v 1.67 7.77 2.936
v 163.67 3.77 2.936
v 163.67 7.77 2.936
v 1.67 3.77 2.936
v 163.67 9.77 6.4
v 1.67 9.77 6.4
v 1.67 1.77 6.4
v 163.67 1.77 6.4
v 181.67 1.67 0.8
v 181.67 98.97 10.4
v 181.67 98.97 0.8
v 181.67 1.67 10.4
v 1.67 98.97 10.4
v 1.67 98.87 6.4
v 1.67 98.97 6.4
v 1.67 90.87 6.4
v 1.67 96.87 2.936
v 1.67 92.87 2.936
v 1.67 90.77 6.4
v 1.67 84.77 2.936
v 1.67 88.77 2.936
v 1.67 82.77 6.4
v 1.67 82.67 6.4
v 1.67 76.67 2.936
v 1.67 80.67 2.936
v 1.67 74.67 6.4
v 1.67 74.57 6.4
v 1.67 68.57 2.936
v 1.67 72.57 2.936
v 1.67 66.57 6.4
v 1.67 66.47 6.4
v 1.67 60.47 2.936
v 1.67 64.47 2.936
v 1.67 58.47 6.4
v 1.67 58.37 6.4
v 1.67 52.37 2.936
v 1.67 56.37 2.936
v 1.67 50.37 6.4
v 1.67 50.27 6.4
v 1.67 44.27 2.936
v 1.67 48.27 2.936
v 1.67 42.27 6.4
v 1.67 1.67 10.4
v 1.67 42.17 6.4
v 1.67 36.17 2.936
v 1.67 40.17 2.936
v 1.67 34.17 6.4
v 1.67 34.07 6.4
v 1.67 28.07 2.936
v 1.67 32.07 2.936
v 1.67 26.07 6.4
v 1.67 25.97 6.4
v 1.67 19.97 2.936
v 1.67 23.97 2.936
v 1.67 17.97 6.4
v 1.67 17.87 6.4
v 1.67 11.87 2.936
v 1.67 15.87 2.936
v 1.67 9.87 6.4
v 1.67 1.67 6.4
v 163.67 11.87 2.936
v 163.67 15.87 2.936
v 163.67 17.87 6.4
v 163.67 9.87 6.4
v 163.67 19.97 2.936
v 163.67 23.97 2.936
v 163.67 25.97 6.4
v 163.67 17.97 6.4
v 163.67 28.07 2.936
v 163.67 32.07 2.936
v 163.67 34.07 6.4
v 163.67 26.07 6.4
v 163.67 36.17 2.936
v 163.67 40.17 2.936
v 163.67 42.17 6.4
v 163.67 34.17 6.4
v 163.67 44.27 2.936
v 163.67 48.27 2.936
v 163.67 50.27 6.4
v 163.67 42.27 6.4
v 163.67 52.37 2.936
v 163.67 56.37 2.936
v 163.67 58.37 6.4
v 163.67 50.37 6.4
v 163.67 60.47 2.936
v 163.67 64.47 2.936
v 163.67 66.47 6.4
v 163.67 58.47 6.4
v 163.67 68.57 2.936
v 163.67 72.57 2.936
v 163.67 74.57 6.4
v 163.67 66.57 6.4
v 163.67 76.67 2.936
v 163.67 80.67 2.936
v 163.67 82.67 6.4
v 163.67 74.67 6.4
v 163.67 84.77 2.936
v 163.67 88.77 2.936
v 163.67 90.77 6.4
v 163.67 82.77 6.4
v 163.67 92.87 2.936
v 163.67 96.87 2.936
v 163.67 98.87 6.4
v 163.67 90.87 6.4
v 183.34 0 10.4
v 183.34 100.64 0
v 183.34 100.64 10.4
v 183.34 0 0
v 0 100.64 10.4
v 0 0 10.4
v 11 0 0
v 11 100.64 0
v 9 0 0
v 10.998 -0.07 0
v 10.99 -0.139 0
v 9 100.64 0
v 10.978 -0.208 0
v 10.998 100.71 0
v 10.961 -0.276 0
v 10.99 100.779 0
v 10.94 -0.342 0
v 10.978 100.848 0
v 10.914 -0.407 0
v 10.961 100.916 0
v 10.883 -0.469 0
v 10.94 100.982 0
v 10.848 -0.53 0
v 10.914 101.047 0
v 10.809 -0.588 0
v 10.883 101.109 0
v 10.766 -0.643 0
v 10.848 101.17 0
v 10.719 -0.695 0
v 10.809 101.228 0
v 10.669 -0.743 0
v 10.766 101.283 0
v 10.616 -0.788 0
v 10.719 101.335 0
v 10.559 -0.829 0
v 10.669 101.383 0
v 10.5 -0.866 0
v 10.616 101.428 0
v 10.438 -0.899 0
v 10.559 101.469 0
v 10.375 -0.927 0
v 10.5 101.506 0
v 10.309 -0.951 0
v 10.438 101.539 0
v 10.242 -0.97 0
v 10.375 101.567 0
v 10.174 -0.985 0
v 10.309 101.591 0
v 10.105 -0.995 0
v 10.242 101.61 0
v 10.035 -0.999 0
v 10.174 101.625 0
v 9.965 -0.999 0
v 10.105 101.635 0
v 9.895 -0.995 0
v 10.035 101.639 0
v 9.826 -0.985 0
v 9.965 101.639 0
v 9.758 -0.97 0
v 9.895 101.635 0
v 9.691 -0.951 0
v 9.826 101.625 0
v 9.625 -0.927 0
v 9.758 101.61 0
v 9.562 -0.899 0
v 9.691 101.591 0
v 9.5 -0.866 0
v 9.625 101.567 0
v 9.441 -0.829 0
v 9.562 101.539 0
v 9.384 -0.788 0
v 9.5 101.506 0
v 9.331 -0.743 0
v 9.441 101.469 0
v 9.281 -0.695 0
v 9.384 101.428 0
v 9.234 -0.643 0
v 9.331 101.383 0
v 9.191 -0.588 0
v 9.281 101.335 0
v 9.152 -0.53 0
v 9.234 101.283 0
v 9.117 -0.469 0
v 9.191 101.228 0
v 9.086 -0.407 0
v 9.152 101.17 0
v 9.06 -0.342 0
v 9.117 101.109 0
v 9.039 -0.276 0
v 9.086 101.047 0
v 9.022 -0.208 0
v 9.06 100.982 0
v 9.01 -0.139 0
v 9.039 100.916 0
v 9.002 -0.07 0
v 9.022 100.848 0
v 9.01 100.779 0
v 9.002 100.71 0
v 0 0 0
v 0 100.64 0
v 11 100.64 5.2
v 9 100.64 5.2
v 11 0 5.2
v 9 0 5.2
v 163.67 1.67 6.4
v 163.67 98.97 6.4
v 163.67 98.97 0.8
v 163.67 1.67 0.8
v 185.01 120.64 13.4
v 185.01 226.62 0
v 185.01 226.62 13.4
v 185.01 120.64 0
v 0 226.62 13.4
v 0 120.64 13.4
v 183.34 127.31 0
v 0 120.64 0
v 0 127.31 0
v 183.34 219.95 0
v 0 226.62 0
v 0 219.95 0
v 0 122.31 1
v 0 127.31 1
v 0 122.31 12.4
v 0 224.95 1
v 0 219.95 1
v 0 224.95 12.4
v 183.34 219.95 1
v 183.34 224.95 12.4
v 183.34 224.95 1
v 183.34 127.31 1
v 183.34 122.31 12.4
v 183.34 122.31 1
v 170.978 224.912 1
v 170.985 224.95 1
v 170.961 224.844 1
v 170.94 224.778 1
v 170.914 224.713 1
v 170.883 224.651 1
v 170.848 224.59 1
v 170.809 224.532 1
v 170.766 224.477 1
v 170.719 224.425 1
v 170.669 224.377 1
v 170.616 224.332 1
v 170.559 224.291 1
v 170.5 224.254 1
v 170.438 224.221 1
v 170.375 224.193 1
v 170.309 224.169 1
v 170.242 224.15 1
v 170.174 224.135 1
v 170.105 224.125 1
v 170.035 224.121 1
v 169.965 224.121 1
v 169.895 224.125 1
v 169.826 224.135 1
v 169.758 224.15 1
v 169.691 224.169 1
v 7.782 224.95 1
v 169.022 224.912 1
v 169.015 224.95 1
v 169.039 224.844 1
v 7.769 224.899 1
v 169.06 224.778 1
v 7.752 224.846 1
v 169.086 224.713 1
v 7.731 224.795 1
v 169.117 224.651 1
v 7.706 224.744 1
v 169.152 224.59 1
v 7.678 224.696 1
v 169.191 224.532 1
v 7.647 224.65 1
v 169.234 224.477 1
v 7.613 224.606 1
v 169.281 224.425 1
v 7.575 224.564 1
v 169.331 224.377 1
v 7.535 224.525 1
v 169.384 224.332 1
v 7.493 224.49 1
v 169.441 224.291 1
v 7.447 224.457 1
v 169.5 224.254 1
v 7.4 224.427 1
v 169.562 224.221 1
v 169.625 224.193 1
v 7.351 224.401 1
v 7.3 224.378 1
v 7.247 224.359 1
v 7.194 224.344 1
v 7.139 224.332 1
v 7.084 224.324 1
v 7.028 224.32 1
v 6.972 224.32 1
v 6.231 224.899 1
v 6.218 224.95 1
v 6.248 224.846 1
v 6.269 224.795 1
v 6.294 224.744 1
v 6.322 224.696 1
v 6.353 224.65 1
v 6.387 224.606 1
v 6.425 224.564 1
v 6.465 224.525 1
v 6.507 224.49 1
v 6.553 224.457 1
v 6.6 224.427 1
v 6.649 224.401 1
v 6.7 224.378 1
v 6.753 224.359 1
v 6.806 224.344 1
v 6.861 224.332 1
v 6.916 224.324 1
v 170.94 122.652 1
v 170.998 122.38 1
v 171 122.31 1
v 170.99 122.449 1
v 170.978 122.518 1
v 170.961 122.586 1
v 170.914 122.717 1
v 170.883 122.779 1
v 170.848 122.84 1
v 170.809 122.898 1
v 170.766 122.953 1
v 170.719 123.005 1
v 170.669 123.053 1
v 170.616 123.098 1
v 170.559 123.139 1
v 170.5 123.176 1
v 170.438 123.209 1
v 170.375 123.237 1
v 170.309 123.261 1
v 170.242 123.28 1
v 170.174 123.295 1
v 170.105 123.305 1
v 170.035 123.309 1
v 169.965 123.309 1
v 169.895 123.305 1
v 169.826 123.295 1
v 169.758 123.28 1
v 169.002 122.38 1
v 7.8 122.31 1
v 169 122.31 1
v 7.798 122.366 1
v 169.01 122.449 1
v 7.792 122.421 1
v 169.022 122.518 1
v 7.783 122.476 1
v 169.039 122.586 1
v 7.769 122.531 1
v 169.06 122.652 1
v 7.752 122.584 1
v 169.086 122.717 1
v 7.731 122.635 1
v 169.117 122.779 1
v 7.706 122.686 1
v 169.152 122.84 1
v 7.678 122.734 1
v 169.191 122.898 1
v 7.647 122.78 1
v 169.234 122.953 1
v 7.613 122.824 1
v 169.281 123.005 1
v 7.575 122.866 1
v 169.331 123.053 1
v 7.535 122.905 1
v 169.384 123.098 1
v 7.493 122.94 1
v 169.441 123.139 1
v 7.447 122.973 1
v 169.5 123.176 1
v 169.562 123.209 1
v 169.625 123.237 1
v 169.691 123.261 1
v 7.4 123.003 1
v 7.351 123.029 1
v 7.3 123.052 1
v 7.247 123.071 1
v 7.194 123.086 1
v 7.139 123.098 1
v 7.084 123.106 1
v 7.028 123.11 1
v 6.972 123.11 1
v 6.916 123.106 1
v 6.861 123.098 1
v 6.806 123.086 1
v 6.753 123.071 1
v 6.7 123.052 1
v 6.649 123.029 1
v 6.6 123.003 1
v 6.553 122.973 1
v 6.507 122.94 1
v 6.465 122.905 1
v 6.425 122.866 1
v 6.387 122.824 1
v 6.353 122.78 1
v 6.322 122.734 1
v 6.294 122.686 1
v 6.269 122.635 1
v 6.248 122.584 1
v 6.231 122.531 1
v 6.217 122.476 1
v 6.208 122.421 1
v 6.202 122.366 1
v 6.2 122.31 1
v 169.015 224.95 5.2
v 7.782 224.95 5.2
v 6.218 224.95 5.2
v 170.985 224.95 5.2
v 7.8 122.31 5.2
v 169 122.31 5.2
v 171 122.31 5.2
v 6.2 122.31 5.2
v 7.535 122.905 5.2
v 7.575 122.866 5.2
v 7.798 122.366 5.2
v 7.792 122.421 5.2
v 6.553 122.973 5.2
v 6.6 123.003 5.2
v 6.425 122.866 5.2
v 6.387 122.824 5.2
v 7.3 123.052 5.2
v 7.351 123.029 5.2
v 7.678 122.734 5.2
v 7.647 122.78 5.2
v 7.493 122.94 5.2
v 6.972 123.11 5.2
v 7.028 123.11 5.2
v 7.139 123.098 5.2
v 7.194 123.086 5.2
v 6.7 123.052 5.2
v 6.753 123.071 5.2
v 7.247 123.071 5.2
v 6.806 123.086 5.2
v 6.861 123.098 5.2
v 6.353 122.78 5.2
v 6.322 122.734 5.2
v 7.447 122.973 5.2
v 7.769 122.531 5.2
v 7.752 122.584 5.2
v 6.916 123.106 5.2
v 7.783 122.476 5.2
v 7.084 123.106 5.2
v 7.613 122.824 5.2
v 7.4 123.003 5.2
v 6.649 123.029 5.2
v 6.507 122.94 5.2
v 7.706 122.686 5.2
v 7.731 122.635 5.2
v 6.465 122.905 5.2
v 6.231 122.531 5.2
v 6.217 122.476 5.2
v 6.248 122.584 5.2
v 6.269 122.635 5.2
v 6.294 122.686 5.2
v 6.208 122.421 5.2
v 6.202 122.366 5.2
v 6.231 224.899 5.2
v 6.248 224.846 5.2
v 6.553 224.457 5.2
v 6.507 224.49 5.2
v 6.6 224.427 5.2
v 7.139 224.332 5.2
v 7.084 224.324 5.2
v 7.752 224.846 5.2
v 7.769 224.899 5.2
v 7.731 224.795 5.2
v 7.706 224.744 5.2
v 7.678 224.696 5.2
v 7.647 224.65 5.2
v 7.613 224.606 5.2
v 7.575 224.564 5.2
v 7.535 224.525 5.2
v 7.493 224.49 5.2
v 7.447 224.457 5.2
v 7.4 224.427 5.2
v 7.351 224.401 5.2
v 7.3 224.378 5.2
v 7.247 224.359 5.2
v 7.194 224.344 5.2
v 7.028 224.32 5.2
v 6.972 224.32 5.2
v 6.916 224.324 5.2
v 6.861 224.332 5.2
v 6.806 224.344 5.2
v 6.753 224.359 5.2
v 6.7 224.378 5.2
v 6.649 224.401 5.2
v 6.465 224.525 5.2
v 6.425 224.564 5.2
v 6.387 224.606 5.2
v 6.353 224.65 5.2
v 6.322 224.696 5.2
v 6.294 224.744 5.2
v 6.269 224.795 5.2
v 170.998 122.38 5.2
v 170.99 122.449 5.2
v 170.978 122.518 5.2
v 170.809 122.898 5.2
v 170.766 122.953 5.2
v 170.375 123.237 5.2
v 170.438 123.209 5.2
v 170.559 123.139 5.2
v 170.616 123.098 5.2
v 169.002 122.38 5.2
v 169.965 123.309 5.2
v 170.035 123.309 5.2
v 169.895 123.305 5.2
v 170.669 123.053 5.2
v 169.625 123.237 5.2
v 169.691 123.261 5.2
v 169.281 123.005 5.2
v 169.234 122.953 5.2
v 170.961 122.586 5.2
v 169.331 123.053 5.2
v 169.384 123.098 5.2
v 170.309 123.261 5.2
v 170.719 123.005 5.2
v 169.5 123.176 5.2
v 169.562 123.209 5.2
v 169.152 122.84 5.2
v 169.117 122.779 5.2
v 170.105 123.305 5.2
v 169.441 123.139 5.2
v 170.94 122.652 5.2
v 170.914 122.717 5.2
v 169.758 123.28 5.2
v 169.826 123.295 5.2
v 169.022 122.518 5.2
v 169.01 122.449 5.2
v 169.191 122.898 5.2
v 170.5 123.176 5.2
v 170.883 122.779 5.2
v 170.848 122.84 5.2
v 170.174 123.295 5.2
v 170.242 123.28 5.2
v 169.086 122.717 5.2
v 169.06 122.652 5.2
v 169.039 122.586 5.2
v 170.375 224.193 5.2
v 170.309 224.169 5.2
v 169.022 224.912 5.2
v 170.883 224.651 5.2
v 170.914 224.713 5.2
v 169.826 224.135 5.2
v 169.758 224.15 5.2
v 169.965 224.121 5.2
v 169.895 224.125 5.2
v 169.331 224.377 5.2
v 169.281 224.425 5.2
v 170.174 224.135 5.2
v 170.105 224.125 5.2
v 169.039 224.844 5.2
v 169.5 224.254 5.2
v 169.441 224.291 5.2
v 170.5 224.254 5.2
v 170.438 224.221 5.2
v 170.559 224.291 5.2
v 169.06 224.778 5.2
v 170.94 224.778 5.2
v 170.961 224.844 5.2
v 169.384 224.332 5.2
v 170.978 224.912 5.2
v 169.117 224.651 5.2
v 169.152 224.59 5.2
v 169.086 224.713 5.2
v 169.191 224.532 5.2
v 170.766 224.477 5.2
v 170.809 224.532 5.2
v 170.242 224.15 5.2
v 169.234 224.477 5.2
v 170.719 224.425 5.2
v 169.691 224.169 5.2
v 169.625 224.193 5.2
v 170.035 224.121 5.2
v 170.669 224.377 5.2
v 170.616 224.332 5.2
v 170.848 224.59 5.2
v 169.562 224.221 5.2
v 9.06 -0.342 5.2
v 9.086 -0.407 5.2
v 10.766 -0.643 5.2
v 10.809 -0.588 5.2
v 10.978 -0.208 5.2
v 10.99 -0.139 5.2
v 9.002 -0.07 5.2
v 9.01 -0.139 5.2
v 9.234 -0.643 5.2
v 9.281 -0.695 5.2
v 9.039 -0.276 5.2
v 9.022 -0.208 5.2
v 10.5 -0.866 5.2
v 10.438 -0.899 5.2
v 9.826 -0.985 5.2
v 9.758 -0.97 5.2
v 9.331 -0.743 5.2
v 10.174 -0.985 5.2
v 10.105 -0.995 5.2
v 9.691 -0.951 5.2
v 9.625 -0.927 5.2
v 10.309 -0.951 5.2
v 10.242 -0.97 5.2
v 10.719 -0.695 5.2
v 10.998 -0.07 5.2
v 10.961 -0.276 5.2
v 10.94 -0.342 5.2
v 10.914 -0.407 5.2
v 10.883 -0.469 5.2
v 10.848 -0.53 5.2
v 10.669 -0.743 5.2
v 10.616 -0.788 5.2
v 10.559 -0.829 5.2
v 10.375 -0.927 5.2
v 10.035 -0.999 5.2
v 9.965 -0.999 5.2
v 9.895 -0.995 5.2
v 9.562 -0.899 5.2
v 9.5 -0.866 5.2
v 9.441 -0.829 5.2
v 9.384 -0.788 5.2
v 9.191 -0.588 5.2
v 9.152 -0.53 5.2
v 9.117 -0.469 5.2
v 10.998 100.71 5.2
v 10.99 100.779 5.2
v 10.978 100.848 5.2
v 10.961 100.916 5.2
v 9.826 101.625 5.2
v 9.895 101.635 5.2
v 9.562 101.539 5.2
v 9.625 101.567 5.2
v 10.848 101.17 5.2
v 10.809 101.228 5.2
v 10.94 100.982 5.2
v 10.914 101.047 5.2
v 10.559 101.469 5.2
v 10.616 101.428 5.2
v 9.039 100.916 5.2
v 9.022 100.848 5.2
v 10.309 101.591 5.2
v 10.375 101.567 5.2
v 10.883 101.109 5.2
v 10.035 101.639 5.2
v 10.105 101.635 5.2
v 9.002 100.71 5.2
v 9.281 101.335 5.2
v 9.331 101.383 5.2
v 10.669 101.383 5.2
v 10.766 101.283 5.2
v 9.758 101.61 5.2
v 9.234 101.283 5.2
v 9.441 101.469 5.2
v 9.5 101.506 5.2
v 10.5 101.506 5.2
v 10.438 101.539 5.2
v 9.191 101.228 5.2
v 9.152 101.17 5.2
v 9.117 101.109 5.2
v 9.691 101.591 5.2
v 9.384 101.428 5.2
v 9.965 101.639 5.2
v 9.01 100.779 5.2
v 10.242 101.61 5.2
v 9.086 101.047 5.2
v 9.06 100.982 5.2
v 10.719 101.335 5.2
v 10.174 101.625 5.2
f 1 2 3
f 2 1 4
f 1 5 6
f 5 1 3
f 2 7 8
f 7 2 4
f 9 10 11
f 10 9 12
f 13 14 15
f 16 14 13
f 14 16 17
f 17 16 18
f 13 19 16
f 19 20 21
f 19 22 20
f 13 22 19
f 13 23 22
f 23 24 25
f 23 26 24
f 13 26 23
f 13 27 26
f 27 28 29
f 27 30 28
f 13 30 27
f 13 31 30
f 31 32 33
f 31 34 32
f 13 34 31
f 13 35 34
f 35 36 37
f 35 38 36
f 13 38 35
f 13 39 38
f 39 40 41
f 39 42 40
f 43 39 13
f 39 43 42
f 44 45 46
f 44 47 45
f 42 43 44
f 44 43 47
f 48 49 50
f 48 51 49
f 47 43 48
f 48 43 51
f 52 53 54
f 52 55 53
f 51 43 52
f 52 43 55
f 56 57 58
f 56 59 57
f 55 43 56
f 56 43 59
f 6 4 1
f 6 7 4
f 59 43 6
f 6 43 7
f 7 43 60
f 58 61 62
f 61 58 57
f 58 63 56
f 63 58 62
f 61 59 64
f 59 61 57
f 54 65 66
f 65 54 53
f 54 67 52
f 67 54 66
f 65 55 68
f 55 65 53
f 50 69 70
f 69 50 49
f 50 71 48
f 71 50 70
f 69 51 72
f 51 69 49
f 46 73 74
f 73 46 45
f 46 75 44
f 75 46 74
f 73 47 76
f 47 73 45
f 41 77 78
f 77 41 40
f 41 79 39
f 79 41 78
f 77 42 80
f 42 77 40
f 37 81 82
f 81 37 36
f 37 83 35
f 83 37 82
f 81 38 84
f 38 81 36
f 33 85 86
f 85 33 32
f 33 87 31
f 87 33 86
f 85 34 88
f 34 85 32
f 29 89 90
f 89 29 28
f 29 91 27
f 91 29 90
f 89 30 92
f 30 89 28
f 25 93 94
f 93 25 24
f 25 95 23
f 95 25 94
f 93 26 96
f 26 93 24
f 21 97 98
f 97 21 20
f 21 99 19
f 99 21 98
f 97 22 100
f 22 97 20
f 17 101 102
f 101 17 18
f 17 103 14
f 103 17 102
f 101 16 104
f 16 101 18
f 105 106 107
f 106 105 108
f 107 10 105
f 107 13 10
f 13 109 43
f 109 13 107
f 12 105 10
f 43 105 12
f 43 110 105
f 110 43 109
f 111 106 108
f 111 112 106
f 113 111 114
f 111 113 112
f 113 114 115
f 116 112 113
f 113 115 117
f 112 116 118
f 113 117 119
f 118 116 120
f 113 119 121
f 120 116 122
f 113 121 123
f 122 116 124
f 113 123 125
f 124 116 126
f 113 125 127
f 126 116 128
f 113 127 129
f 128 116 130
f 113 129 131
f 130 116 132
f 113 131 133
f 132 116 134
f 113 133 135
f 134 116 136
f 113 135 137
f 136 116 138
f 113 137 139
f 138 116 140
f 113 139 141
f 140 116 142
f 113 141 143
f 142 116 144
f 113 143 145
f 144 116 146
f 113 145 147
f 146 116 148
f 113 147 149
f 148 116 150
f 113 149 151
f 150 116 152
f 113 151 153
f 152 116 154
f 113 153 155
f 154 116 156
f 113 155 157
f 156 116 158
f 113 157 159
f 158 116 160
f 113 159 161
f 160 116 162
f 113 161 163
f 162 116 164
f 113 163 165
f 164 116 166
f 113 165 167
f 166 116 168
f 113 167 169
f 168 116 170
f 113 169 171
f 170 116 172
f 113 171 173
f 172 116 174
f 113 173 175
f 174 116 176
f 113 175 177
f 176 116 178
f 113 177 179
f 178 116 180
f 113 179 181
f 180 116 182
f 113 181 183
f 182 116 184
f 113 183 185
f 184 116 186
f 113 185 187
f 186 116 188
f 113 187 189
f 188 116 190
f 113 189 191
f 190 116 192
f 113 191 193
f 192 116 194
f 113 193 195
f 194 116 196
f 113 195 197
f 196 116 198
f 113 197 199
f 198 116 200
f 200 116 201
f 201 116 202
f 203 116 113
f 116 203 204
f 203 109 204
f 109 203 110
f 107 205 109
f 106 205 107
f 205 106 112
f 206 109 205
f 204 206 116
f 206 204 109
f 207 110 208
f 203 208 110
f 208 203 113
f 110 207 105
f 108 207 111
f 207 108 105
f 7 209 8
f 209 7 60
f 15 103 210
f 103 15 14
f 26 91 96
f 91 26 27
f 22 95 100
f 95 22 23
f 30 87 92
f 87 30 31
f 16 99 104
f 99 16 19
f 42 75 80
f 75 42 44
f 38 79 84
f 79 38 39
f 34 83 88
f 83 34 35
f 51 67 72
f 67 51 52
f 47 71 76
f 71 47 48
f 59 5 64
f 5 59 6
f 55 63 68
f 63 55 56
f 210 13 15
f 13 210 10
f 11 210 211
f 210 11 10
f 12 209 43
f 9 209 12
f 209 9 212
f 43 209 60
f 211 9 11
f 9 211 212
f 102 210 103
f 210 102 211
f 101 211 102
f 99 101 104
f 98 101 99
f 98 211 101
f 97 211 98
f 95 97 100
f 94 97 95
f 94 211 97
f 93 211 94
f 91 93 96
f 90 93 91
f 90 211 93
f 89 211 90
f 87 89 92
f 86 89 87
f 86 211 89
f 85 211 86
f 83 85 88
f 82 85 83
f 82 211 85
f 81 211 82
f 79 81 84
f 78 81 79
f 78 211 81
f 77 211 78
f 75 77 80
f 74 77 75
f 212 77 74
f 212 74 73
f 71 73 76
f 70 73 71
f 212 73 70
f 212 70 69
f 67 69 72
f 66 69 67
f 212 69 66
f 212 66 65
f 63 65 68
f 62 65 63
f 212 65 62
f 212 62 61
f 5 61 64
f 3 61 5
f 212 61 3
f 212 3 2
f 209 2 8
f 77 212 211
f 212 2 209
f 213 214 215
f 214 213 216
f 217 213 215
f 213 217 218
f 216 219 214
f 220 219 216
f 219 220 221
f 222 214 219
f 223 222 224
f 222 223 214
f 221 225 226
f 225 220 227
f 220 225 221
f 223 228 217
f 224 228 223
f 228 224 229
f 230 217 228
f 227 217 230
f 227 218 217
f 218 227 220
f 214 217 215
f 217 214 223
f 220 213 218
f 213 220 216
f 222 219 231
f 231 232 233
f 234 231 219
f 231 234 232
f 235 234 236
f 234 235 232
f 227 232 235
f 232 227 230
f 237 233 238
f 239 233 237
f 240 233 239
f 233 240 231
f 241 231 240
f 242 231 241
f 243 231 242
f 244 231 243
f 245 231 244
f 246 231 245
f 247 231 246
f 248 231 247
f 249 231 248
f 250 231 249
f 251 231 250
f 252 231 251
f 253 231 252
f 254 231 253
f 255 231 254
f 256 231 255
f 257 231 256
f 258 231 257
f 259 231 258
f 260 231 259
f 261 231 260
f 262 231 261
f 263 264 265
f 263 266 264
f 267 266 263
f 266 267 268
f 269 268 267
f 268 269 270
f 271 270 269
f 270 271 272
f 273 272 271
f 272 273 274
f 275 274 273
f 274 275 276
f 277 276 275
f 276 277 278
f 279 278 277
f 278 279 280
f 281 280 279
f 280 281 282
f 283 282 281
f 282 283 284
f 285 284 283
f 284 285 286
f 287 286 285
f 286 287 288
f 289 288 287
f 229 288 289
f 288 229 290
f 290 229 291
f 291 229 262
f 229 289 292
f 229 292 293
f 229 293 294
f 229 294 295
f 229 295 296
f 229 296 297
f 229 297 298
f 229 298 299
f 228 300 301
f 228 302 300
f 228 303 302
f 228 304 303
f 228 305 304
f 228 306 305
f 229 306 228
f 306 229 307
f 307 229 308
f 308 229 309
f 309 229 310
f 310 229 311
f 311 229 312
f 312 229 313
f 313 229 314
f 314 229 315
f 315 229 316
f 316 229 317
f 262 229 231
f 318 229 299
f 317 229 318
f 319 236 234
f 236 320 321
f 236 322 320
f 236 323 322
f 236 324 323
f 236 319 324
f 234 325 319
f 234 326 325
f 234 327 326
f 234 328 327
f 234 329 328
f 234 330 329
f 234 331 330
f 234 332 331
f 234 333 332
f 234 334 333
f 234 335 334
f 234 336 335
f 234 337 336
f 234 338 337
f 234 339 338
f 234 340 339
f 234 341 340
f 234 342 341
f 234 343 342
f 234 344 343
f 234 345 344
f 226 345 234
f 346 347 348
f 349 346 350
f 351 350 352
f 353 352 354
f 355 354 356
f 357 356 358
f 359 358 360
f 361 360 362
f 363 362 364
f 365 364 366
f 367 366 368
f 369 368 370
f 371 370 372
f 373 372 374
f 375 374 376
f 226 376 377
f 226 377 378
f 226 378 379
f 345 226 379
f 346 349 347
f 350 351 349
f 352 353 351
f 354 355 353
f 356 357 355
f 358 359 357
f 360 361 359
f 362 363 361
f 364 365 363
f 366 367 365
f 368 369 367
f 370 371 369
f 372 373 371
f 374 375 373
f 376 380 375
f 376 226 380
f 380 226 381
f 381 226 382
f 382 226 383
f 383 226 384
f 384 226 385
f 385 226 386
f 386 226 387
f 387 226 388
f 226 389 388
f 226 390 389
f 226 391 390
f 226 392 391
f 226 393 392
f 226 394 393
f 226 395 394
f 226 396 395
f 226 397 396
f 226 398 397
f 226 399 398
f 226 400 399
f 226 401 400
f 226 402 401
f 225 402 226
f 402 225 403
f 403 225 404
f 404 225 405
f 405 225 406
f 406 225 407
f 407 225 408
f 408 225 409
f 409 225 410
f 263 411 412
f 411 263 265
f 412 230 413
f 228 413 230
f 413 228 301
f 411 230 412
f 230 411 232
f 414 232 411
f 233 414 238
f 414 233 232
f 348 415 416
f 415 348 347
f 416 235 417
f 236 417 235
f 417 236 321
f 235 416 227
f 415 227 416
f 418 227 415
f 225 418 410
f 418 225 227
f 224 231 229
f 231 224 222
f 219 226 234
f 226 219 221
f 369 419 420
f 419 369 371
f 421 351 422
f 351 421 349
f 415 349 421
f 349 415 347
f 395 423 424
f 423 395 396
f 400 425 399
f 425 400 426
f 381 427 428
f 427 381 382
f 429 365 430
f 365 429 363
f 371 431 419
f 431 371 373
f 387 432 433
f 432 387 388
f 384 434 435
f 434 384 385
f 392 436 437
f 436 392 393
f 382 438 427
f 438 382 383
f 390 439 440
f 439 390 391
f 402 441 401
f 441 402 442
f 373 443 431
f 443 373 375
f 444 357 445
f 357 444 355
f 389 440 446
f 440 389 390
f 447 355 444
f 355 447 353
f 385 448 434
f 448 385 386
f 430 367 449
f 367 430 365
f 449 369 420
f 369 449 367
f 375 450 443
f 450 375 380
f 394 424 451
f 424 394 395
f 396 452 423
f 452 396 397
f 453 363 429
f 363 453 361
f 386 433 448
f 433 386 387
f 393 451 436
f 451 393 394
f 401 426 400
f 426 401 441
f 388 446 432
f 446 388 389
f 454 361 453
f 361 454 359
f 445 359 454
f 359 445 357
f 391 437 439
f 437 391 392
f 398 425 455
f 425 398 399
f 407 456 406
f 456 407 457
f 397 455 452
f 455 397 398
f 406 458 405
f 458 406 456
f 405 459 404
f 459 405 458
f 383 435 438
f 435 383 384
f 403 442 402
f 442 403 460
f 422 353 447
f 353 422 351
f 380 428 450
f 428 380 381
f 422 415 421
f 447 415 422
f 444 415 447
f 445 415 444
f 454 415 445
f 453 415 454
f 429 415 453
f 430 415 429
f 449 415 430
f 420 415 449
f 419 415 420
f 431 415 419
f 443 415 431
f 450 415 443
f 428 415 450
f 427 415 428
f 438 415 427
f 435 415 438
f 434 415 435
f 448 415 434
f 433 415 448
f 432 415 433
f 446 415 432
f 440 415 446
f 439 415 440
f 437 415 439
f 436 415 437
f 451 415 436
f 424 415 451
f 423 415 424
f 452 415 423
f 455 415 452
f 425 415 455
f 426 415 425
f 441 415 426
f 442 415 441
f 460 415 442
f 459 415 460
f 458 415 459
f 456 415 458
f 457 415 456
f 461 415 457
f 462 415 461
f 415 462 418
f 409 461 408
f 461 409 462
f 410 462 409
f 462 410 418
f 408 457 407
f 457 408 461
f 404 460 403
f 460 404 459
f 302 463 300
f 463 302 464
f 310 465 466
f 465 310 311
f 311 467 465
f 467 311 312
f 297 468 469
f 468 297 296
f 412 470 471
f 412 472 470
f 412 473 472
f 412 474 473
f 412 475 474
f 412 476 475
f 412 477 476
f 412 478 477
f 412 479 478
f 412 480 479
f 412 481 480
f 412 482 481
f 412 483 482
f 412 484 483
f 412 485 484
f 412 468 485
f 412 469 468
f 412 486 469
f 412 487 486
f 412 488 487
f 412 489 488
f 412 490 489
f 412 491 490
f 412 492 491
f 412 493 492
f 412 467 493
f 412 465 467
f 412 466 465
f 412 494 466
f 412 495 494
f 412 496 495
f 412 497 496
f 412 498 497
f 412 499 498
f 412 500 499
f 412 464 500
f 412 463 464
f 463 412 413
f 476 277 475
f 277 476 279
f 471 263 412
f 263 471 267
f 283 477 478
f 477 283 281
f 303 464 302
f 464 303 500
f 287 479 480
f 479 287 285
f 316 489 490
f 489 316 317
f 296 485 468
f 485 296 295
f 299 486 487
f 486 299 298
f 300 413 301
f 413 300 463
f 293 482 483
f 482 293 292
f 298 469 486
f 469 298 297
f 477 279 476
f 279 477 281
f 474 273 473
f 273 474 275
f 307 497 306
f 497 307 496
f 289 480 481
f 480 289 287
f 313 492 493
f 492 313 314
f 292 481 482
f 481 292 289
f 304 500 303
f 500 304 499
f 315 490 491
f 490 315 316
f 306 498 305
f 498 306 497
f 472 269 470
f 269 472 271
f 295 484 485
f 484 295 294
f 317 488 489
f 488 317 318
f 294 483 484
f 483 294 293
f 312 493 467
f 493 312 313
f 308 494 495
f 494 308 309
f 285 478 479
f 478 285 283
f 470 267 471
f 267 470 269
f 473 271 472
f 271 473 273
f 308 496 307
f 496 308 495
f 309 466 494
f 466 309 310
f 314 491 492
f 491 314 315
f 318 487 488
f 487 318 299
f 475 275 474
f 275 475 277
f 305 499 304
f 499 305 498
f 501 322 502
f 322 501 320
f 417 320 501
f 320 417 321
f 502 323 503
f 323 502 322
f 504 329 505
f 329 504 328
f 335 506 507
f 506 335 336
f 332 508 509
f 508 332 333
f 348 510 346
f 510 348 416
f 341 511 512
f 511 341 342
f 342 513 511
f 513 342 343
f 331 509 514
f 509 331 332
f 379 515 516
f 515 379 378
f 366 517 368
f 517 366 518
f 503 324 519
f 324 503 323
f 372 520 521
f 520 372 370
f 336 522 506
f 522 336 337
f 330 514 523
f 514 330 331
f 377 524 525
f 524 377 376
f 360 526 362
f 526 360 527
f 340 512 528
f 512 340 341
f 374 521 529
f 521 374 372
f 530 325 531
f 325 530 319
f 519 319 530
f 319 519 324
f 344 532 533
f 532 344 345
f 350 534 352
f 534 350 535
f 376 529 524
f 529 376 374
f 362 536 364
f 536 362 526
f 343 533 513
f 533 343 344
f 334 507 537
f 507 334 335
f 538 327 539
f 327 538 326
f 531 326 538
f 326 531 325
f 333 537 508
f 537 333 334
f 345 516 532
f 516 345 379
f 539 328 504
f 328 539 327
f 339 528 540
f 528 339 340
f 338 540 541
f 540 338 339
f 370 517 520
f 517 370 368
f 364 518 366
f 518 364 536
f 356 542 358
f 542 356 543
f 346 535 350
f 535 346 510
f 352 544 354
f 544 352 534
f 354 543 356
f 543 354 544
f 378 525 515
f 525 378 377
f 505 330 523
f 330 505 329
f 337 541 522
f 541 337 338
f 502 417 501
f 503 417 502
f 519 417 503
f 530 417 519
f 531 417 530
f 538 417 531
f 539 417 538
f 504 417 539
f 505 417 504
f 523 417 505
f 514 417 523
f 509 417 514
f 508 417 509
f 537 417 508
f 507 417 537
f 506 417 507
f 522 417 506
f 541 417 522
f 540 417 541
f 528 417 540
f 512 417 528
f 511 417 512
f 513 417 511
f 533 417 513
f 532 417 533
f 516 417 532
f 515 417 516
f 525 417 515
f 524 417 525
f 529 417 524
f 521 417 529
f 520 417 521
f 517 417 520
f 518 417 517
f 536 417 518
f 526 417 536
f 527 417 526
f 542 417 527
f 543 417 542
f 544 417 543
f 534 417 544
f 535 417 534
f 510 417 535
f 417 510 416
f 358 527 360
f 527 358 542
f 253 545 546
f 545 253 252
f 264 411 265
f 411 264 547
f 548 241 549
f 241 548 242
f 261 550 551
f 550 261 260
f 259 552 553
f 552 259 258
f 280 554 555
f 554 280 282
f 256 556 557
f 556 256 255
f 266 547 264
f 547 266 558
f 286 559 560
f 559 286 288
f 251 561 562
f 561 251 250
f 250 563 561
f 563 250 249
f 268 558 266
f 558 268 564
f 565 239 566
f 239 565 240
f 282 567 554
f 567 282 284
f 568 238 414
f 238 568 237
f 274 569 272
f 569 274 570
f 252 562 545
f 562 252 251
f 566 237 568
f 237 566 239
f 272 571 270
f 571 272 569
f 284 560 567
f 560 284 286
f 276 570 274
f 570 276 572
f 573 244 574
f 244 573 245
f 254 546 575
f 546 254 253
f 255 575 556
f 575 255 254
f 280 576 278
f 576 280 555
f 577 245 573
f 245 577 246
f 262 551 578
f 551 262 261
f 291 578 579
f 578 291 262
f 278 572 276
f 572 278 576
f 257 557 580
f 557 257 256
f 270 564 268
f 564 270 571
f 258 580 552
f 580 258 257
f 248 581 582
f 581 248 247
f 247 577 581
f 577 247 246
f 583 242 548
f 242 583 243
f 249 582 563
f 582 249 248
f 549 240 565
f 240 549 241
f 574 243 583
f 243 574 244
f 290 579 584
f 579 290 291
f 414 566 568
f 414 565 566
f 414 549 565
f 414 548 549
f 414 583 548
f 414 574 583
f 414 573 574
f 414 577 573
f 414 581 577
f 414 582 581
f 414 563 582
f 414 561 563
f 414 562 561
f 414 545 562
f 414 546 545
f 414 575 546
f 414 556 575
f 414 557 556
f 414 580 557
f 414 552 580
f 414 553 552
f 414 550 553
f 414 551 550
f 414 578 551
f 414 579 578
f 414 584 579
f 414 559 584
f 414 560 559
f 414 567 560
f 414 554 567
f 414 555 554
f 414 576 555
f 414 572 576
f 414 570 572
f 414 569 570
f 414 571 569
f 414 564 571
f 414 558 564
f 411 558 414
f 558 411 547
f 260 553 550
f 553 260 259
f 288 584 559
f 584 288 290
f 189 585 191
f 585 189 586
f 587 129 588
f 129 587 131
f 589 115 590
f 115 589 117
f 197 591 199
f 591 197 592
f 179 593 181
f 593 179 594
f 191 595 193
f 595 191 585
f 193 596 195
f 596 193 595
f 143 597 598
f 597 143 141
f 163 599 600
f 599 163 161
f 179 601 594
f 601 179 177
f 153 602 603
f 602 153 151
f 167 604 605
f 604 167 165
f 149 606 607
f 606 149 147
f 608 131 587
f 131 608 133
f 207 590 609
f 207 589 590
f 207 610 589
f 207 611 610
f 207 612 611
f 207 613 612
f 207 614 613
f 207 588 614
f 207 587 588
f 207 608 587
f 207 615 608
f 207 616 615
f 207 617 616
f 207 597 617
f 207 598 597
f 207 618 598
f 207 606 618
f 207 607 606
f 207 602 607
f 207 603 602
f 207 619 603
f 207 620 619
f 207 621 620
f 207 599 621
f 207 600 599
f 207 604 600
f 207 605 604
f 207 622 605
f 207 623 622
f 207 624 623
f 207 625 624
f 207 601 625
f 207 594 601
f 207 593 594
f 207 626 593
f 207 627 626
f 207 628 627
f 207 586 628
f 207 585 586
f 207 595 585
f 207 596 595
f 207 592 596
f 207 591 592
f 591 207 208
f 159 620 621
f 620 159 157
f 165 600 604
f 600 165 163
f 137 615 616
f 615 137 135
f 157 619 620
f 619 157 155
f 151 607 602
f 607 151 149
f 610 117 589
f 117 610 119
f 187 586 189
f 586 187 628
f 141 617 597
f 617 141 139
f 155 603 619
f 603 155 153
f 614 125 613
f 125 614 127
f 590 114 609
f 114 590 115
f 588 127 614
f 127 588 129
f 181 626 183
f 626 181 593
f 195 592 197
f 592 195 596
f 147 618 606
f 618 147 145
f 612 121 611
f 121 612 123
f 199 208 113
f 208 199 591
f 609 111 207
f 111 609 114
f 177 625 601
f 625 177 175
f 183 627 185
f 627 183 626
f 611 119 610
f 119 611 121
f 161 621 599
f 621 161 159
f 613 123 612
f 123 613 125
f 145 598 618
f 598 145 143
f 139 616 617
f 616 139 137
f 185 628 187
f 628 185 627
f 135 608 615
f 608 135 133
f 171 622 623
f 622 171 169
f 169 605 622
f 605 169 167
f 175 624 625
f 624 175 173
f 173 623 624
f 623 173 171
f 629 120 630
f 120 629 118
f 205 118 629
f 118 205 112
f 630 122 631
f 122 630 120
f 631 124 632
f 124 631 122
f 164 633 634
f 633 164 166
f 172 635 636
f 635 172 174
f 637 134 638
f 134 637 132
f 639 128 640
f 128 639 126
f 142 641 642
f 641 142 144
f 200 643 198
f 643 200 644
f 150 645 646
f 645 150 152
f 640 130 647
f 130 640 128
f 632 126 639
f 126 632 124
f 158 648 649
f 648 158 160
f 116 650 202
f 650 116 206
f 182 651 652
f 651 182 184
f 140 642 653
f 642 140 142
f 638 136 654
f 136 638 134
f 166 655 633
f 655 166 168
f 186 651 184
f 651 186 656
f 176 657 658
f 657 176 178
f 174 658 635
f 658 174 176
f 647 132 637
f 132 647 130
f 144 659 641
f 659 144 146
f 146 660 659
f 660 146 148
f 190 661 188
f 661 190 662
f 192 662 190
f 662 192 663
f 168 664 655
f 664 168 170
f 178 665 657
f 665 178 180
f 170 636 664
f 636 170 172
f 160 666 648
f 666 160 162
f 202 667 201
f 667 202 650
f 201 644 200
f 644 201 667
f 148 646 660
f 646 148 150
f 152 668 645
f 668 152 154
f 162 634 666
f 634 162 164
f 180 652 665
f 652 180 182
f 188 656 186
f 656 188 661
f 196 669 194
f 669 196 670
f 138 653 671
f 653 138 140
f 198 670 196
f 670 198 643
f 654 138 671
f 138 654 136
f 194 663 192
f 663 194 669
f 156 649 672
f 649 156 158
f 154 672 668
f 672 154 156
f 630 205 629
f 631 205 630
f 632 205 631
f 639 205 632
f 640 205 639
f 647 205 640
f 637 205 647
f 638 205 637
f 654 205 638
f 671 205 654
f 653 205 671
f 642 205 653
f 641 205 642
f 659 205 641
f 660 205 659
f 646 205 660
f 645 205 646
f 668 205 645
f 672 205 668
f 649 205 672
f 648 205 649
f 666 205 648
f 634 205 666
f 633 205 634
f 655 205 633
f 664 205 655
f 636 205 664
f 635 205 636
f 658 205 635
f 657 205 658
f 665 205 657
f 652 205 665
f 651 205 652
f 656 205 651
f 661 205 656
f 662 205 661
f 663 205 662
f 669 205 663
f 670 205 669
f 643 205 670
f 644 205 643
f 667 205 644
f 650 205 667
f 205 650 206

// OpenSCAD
/*
 * Pencil Box
 *
 * Author: Pavel Rampas
 * Version: 1.0.0 (Changelog is at the bottom)
 * License: CC BY-SA 4.0 [https://creativecommons.org/licenses/by-sa/4.0/]
 * Link: https://github.com/pavelrampas/openscad-models
 *
 * OpenSCAD version: 2021.01
 *
 * Instructions:
 * Set up parameters, render and print.
 *
 * Height is layer.
 * Thickness is perimeter.
 */

// Parameters
//------------------------------------------------------------------------------

$fn = $preview ? 15 : 90;

number = 12; // number of pencils
length = 180; // pencil length
diamater = 8; // pencil diamater

// Parameters that don't need to be changed
//------------------------------------------------------------------------------

layerHeight = 0.2;
baseHeight = 3 * layerHeight;
thickness = 1.67; // wall thickness for 0.4 nozzle
spaceHeight = 1.8; // bottom space height
space = 0.1; // space between pencils
lockD = 2; // lock diameter

coverLockD = 1.6; // lock diameter

// Code
//------------------------------------------------------------------------------

width = (thickness * 2) + ((diamater + space) * number) + space;
widthInner = ((diamater + space) * number) + space;

// case
difference() {
    // base cube
    cube([length + (2 * thickness), width, baseHeight + spaceHeight + diamater]);

    // inner cube
    translate([
        thickness,
        thickness,
        baseHeight + spaceHeight + (diamater / 2)
    ]) {
        cube([length, widthInner, baseHeight + spaceHeight + diamater]);
    }

    // bottom space cube
    translate([thickness + length - 18, thickness, baseHeight + layerHeight]) {
        cube([18, widthInner, baseHeight + spaceHeight + diamater]);
    }

    // pencils
    for (i = [0 : number - 1]) {
        translate([0, i * (diamater + space), 0]) {
            #_pencil();
        }
    }
}

// lock
translate([10, 0, 0]) {
    cylinder(
        h = (baseHeight + spaceHeight + diamater) / 2,
        d1 = lockD,
        d2 = lockD
    );
}
translate([10, width, 0]) {
    cylinder(
        h = (baseHeight + spaceHeight + diamater) / 2,
        d1 = lockD,
        d2 = lockD
    );
}

// cover
translate([0, width + 20, 0]) {
    difference() {
        cube([
            length + (3 * thickness),
            width + (2 * thickness) + 2,
            baseHeight + spaceHeight + diamater + 3
        ]);

        translate([0, thickness, 1]) {
            cube([
                length + (2 * thickness),
                width + 2,
                baseHeight + spaceHeight + diamater + 1
            ]);
        }

        translate([0, thickness + 1 + 4, 0]) {
            cube([
                length + (2 * thickness),
                width - 8,
                baseHeight + spaceHeight + diamater
            ]);
        }
    }

    // lock
    translate([7, thickness, 0]) {
        cylinder(
            h = (baseHeight + spaceHeight + diamater) / 2,
            d1 = coverLockD,
            d2 = coverLockD
        );
    }
    translate([7, width + (2 * thickness) + 0.5, 0]) {
        cylinder(
            h = (baseHeight + spaceHeight + diamater) / 2,
            d1 = coverLockD,
            d2 = coverLockD
        );
    }

    translate([length - 10, thickness, 0]) {
        cylinder(
            h = (baseHeight + spaceHeight + diamater) / 2,
            d1 = lockD,
            d2 = lockD
        );
    }
    translate([length - 10, width + (2 * thickness) + 0.5, 0]) {
        cylinder(
            h = (baseHeight + spaceHeight + diamater) / 2,
            d1 = lockD,
            d2 = lockD
        );
    }
}

// Functions
//------------------------------------------------------------------------------

// Modules
//------------------------------------------------------------------------------

module _pencil() {
    translate([
        thickness,
        thickness + (diamater / 2) + space,
        (diamater / 2) + baseHeight + spaceHeight
    ]) {
        rotate([90, 0, 90]) {
            cylinder($fn = 6, h = length, d1 = diamater, d2 = diamater);
        }
    }
}

// Changelog
//------------------------------------------------------------------------------

// [1.0.0]:
// Initial release.
